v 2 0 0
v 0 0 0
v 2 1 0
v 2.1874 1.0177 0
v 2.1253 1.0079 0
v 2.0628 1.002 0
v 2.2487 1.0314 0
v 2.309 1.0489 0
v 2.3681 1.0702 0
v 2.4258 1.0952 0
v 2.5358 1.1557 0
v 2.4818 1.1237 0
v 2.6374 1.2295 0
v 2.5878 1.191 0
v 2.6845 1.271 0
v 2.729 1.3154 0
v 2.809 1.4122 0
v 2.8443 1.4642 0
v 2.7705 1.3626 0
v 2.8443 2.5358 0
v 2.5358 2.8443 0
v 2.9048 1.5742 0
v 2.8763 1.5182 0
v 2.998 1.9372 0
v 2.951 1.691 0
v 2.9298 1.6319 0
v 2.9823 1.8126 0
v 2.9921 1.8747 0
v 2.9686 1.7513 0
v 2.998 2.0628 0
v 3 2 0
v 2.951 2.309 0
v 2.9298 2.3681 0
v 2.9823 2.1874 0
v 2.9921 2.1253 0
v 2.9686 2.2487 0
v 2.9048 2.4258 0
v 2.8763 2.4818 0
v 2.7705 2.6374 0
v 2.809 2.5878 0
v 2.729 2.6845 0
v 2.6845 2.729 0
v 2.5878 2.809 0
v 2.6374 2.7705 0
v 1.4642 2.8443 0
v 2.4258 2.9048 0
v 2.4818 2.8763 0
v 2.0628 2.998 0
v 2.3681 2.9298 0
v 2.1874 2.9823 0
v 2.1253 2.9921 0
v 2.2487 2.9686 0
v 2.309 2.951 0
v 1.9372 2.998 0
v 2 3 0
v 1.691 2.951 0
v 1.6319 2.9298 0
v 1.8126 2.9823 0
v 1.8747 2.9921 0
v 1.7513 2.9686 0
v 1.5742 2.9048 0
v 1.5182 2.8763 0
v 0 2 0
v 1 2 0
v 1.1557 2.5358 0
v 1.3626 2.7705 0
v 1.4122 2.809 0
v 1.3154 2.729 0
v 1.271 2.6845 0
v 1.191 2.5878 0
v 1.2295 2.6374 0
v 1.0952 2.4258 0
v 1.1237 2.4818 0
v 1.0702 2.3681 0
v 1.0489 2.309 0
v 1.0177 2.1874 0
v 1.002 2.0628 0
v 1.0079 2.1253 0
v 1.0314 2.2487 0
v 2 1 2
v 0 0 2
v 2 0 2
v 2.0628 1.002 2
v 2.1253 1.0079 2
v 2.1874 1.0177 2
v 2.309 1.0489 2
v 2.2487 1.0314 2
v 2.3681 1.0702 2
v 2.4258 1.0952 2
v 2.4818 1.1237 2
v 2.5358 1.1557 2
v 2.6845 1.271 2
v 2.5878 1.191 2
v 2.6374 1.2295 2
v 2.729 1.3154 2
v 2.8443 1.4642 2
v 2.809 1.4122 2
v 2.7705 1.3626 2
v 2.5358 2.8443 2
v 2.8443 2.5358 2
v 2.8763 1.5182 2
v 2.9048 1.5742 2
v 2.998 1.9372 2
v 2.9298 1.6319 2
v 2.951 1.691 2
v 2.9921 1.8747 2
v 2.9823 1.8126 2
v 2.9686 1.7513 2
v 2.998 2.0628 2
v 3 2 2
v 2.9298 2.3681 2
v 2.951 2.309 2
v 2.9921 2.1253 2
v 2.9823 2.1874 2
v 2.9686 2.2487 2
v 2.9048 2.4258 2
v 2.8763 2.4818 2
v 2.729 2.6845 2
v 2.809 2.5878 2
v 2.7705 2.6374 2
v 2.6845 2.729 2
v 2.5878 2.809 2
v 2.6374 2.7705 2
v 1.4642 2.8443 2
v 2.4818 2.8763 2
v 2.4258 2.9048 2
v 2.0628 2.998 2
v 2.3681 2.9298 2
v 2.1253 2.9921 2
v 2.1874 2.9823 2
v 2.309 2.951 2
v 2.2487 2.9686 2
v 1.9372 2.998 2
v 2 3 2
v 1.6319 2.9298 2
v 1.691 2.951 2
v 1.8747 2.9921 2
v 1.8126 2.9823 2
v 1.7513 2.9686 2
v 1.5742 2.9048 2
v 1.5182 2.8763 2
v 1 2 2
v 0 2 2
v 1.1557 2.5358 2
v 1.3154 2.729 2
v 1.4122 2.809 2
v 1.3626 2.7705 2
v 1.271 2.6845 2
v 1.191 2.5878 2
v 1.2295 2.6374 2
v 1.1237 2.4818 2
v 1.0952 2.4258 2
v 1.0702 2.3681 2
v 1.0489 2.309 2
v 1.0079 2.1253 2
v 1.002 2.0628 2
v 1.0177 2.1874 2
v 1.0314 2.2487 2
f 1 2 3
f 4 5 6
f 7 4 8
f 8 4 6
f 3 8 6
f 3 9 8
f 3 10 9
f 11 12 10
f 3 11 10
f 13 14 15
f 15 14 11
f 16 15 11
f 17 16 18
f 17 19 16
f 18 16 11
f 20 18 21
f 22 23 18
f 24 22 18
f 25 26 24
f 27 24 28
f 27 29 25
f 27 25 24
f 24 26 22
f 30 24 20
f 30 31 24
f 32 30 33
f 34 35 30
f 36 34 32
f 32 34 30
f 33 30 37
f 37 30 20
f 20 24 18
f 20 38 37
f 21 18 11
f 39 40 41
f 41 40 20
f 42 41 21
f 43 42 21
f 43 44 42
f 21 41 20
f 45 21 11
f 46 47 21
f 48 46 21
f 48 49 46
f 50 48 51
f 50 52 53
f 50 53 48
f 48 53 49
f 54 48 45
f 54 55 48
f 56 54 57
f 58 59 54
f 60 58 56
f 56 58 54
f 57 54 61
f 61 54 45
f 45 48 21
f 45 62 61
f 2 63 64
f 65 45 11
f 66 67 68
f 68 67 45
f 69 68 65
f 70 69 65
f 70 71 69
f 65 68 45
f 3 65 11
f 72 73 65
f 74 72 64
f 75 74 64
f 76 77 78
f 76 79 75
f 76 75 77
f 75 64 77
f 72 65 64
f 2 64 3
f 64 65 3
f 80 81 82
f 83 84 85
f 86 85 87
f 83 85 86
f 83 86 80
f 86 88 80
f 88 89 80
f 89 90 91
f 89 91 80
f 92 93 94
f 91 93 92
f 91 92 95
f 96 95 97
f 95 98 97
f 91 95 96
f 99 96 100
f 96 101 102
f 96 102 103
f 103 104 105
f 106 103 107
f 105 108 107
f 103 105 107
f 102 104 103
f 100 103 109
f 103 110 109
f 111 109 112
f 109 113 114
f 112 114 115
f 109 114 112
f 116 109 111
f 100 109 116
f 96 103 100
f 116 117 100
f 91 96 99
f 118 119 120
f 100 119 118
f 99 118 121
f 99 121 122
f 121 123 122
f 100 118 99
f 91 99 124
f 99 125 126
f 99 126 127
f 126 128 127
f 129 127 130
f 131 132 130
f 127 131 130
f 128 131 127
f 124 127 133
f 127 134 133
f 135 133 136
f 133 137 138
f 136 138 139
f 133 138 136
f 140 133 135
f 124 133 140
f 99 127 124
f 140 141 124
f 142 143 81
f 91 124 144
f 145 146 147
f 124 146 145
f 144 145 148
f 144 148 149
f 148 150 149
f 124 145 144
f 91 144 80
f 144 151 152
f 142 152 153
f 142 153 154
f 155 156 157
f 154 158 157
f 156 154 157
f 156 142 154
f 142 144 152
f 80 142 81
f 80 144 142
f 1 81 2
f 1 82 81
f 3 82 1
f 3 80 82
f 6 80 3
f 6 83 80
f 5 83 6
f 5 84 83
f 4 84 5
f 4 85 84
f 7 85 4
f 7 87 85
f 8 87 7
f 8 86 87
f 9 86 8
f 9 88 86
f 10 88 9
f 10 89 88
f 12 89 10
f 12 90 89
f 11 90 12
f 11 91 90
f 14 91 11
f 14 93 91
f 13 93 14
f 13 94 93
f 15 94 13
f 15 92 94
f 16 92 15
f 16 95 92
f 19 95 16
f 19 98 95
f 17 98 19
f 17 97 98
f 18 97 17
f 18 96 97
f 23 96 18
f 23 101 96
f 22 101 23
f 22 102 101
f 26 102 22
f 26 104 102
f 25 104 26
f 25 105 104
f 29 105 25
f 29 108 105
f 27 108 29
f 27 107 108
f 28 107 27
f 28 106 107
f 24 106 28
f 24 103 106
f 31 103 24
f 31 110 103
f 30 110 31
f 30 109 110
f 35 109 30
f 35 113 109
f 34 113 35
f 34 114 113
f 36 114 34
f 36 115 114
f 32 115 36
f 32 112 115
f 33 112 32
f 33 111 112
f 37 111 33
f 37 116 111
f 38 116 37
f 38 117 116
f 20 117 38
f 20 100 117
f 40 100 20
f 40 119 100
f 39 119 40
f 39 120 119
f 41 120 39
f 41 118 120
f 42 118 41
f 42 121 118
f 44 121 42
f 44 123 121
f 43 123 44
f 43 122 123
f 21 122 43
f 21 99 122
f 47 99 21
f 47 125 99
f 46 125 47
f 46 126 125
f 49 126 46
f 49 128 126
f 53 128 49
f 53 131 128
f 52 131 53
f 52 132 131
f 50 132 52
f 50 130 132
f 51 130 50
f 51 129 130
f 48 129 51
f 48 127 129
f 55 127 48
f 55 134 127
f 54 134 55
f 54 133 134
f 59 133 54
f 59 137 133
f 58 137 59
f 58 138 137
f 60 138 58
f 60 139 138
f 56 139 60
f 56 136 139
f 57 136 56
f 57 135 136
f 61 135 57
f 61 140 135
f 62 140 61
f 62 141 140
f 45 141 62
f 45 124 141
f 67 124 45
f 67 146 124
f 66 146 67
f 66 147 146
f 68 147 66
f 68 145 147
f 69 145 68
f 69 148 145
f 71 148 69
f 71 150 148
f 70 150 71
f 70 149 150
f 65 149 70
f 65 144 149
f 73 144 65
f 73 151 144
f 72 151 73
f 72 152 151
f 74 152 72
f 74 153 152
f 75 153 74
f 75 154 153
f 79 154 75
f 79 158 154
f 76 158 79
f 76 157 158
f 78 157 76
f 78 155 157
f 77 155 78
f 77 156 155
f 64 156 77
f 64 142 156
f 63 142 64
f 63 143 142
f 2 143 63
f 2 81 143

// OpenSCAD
$fn=100;
linear_extrude(height=2)
union() {
  square(size=[2, 2], center=false);
  translate([2, 2, 0]) circle(r=1);
}
